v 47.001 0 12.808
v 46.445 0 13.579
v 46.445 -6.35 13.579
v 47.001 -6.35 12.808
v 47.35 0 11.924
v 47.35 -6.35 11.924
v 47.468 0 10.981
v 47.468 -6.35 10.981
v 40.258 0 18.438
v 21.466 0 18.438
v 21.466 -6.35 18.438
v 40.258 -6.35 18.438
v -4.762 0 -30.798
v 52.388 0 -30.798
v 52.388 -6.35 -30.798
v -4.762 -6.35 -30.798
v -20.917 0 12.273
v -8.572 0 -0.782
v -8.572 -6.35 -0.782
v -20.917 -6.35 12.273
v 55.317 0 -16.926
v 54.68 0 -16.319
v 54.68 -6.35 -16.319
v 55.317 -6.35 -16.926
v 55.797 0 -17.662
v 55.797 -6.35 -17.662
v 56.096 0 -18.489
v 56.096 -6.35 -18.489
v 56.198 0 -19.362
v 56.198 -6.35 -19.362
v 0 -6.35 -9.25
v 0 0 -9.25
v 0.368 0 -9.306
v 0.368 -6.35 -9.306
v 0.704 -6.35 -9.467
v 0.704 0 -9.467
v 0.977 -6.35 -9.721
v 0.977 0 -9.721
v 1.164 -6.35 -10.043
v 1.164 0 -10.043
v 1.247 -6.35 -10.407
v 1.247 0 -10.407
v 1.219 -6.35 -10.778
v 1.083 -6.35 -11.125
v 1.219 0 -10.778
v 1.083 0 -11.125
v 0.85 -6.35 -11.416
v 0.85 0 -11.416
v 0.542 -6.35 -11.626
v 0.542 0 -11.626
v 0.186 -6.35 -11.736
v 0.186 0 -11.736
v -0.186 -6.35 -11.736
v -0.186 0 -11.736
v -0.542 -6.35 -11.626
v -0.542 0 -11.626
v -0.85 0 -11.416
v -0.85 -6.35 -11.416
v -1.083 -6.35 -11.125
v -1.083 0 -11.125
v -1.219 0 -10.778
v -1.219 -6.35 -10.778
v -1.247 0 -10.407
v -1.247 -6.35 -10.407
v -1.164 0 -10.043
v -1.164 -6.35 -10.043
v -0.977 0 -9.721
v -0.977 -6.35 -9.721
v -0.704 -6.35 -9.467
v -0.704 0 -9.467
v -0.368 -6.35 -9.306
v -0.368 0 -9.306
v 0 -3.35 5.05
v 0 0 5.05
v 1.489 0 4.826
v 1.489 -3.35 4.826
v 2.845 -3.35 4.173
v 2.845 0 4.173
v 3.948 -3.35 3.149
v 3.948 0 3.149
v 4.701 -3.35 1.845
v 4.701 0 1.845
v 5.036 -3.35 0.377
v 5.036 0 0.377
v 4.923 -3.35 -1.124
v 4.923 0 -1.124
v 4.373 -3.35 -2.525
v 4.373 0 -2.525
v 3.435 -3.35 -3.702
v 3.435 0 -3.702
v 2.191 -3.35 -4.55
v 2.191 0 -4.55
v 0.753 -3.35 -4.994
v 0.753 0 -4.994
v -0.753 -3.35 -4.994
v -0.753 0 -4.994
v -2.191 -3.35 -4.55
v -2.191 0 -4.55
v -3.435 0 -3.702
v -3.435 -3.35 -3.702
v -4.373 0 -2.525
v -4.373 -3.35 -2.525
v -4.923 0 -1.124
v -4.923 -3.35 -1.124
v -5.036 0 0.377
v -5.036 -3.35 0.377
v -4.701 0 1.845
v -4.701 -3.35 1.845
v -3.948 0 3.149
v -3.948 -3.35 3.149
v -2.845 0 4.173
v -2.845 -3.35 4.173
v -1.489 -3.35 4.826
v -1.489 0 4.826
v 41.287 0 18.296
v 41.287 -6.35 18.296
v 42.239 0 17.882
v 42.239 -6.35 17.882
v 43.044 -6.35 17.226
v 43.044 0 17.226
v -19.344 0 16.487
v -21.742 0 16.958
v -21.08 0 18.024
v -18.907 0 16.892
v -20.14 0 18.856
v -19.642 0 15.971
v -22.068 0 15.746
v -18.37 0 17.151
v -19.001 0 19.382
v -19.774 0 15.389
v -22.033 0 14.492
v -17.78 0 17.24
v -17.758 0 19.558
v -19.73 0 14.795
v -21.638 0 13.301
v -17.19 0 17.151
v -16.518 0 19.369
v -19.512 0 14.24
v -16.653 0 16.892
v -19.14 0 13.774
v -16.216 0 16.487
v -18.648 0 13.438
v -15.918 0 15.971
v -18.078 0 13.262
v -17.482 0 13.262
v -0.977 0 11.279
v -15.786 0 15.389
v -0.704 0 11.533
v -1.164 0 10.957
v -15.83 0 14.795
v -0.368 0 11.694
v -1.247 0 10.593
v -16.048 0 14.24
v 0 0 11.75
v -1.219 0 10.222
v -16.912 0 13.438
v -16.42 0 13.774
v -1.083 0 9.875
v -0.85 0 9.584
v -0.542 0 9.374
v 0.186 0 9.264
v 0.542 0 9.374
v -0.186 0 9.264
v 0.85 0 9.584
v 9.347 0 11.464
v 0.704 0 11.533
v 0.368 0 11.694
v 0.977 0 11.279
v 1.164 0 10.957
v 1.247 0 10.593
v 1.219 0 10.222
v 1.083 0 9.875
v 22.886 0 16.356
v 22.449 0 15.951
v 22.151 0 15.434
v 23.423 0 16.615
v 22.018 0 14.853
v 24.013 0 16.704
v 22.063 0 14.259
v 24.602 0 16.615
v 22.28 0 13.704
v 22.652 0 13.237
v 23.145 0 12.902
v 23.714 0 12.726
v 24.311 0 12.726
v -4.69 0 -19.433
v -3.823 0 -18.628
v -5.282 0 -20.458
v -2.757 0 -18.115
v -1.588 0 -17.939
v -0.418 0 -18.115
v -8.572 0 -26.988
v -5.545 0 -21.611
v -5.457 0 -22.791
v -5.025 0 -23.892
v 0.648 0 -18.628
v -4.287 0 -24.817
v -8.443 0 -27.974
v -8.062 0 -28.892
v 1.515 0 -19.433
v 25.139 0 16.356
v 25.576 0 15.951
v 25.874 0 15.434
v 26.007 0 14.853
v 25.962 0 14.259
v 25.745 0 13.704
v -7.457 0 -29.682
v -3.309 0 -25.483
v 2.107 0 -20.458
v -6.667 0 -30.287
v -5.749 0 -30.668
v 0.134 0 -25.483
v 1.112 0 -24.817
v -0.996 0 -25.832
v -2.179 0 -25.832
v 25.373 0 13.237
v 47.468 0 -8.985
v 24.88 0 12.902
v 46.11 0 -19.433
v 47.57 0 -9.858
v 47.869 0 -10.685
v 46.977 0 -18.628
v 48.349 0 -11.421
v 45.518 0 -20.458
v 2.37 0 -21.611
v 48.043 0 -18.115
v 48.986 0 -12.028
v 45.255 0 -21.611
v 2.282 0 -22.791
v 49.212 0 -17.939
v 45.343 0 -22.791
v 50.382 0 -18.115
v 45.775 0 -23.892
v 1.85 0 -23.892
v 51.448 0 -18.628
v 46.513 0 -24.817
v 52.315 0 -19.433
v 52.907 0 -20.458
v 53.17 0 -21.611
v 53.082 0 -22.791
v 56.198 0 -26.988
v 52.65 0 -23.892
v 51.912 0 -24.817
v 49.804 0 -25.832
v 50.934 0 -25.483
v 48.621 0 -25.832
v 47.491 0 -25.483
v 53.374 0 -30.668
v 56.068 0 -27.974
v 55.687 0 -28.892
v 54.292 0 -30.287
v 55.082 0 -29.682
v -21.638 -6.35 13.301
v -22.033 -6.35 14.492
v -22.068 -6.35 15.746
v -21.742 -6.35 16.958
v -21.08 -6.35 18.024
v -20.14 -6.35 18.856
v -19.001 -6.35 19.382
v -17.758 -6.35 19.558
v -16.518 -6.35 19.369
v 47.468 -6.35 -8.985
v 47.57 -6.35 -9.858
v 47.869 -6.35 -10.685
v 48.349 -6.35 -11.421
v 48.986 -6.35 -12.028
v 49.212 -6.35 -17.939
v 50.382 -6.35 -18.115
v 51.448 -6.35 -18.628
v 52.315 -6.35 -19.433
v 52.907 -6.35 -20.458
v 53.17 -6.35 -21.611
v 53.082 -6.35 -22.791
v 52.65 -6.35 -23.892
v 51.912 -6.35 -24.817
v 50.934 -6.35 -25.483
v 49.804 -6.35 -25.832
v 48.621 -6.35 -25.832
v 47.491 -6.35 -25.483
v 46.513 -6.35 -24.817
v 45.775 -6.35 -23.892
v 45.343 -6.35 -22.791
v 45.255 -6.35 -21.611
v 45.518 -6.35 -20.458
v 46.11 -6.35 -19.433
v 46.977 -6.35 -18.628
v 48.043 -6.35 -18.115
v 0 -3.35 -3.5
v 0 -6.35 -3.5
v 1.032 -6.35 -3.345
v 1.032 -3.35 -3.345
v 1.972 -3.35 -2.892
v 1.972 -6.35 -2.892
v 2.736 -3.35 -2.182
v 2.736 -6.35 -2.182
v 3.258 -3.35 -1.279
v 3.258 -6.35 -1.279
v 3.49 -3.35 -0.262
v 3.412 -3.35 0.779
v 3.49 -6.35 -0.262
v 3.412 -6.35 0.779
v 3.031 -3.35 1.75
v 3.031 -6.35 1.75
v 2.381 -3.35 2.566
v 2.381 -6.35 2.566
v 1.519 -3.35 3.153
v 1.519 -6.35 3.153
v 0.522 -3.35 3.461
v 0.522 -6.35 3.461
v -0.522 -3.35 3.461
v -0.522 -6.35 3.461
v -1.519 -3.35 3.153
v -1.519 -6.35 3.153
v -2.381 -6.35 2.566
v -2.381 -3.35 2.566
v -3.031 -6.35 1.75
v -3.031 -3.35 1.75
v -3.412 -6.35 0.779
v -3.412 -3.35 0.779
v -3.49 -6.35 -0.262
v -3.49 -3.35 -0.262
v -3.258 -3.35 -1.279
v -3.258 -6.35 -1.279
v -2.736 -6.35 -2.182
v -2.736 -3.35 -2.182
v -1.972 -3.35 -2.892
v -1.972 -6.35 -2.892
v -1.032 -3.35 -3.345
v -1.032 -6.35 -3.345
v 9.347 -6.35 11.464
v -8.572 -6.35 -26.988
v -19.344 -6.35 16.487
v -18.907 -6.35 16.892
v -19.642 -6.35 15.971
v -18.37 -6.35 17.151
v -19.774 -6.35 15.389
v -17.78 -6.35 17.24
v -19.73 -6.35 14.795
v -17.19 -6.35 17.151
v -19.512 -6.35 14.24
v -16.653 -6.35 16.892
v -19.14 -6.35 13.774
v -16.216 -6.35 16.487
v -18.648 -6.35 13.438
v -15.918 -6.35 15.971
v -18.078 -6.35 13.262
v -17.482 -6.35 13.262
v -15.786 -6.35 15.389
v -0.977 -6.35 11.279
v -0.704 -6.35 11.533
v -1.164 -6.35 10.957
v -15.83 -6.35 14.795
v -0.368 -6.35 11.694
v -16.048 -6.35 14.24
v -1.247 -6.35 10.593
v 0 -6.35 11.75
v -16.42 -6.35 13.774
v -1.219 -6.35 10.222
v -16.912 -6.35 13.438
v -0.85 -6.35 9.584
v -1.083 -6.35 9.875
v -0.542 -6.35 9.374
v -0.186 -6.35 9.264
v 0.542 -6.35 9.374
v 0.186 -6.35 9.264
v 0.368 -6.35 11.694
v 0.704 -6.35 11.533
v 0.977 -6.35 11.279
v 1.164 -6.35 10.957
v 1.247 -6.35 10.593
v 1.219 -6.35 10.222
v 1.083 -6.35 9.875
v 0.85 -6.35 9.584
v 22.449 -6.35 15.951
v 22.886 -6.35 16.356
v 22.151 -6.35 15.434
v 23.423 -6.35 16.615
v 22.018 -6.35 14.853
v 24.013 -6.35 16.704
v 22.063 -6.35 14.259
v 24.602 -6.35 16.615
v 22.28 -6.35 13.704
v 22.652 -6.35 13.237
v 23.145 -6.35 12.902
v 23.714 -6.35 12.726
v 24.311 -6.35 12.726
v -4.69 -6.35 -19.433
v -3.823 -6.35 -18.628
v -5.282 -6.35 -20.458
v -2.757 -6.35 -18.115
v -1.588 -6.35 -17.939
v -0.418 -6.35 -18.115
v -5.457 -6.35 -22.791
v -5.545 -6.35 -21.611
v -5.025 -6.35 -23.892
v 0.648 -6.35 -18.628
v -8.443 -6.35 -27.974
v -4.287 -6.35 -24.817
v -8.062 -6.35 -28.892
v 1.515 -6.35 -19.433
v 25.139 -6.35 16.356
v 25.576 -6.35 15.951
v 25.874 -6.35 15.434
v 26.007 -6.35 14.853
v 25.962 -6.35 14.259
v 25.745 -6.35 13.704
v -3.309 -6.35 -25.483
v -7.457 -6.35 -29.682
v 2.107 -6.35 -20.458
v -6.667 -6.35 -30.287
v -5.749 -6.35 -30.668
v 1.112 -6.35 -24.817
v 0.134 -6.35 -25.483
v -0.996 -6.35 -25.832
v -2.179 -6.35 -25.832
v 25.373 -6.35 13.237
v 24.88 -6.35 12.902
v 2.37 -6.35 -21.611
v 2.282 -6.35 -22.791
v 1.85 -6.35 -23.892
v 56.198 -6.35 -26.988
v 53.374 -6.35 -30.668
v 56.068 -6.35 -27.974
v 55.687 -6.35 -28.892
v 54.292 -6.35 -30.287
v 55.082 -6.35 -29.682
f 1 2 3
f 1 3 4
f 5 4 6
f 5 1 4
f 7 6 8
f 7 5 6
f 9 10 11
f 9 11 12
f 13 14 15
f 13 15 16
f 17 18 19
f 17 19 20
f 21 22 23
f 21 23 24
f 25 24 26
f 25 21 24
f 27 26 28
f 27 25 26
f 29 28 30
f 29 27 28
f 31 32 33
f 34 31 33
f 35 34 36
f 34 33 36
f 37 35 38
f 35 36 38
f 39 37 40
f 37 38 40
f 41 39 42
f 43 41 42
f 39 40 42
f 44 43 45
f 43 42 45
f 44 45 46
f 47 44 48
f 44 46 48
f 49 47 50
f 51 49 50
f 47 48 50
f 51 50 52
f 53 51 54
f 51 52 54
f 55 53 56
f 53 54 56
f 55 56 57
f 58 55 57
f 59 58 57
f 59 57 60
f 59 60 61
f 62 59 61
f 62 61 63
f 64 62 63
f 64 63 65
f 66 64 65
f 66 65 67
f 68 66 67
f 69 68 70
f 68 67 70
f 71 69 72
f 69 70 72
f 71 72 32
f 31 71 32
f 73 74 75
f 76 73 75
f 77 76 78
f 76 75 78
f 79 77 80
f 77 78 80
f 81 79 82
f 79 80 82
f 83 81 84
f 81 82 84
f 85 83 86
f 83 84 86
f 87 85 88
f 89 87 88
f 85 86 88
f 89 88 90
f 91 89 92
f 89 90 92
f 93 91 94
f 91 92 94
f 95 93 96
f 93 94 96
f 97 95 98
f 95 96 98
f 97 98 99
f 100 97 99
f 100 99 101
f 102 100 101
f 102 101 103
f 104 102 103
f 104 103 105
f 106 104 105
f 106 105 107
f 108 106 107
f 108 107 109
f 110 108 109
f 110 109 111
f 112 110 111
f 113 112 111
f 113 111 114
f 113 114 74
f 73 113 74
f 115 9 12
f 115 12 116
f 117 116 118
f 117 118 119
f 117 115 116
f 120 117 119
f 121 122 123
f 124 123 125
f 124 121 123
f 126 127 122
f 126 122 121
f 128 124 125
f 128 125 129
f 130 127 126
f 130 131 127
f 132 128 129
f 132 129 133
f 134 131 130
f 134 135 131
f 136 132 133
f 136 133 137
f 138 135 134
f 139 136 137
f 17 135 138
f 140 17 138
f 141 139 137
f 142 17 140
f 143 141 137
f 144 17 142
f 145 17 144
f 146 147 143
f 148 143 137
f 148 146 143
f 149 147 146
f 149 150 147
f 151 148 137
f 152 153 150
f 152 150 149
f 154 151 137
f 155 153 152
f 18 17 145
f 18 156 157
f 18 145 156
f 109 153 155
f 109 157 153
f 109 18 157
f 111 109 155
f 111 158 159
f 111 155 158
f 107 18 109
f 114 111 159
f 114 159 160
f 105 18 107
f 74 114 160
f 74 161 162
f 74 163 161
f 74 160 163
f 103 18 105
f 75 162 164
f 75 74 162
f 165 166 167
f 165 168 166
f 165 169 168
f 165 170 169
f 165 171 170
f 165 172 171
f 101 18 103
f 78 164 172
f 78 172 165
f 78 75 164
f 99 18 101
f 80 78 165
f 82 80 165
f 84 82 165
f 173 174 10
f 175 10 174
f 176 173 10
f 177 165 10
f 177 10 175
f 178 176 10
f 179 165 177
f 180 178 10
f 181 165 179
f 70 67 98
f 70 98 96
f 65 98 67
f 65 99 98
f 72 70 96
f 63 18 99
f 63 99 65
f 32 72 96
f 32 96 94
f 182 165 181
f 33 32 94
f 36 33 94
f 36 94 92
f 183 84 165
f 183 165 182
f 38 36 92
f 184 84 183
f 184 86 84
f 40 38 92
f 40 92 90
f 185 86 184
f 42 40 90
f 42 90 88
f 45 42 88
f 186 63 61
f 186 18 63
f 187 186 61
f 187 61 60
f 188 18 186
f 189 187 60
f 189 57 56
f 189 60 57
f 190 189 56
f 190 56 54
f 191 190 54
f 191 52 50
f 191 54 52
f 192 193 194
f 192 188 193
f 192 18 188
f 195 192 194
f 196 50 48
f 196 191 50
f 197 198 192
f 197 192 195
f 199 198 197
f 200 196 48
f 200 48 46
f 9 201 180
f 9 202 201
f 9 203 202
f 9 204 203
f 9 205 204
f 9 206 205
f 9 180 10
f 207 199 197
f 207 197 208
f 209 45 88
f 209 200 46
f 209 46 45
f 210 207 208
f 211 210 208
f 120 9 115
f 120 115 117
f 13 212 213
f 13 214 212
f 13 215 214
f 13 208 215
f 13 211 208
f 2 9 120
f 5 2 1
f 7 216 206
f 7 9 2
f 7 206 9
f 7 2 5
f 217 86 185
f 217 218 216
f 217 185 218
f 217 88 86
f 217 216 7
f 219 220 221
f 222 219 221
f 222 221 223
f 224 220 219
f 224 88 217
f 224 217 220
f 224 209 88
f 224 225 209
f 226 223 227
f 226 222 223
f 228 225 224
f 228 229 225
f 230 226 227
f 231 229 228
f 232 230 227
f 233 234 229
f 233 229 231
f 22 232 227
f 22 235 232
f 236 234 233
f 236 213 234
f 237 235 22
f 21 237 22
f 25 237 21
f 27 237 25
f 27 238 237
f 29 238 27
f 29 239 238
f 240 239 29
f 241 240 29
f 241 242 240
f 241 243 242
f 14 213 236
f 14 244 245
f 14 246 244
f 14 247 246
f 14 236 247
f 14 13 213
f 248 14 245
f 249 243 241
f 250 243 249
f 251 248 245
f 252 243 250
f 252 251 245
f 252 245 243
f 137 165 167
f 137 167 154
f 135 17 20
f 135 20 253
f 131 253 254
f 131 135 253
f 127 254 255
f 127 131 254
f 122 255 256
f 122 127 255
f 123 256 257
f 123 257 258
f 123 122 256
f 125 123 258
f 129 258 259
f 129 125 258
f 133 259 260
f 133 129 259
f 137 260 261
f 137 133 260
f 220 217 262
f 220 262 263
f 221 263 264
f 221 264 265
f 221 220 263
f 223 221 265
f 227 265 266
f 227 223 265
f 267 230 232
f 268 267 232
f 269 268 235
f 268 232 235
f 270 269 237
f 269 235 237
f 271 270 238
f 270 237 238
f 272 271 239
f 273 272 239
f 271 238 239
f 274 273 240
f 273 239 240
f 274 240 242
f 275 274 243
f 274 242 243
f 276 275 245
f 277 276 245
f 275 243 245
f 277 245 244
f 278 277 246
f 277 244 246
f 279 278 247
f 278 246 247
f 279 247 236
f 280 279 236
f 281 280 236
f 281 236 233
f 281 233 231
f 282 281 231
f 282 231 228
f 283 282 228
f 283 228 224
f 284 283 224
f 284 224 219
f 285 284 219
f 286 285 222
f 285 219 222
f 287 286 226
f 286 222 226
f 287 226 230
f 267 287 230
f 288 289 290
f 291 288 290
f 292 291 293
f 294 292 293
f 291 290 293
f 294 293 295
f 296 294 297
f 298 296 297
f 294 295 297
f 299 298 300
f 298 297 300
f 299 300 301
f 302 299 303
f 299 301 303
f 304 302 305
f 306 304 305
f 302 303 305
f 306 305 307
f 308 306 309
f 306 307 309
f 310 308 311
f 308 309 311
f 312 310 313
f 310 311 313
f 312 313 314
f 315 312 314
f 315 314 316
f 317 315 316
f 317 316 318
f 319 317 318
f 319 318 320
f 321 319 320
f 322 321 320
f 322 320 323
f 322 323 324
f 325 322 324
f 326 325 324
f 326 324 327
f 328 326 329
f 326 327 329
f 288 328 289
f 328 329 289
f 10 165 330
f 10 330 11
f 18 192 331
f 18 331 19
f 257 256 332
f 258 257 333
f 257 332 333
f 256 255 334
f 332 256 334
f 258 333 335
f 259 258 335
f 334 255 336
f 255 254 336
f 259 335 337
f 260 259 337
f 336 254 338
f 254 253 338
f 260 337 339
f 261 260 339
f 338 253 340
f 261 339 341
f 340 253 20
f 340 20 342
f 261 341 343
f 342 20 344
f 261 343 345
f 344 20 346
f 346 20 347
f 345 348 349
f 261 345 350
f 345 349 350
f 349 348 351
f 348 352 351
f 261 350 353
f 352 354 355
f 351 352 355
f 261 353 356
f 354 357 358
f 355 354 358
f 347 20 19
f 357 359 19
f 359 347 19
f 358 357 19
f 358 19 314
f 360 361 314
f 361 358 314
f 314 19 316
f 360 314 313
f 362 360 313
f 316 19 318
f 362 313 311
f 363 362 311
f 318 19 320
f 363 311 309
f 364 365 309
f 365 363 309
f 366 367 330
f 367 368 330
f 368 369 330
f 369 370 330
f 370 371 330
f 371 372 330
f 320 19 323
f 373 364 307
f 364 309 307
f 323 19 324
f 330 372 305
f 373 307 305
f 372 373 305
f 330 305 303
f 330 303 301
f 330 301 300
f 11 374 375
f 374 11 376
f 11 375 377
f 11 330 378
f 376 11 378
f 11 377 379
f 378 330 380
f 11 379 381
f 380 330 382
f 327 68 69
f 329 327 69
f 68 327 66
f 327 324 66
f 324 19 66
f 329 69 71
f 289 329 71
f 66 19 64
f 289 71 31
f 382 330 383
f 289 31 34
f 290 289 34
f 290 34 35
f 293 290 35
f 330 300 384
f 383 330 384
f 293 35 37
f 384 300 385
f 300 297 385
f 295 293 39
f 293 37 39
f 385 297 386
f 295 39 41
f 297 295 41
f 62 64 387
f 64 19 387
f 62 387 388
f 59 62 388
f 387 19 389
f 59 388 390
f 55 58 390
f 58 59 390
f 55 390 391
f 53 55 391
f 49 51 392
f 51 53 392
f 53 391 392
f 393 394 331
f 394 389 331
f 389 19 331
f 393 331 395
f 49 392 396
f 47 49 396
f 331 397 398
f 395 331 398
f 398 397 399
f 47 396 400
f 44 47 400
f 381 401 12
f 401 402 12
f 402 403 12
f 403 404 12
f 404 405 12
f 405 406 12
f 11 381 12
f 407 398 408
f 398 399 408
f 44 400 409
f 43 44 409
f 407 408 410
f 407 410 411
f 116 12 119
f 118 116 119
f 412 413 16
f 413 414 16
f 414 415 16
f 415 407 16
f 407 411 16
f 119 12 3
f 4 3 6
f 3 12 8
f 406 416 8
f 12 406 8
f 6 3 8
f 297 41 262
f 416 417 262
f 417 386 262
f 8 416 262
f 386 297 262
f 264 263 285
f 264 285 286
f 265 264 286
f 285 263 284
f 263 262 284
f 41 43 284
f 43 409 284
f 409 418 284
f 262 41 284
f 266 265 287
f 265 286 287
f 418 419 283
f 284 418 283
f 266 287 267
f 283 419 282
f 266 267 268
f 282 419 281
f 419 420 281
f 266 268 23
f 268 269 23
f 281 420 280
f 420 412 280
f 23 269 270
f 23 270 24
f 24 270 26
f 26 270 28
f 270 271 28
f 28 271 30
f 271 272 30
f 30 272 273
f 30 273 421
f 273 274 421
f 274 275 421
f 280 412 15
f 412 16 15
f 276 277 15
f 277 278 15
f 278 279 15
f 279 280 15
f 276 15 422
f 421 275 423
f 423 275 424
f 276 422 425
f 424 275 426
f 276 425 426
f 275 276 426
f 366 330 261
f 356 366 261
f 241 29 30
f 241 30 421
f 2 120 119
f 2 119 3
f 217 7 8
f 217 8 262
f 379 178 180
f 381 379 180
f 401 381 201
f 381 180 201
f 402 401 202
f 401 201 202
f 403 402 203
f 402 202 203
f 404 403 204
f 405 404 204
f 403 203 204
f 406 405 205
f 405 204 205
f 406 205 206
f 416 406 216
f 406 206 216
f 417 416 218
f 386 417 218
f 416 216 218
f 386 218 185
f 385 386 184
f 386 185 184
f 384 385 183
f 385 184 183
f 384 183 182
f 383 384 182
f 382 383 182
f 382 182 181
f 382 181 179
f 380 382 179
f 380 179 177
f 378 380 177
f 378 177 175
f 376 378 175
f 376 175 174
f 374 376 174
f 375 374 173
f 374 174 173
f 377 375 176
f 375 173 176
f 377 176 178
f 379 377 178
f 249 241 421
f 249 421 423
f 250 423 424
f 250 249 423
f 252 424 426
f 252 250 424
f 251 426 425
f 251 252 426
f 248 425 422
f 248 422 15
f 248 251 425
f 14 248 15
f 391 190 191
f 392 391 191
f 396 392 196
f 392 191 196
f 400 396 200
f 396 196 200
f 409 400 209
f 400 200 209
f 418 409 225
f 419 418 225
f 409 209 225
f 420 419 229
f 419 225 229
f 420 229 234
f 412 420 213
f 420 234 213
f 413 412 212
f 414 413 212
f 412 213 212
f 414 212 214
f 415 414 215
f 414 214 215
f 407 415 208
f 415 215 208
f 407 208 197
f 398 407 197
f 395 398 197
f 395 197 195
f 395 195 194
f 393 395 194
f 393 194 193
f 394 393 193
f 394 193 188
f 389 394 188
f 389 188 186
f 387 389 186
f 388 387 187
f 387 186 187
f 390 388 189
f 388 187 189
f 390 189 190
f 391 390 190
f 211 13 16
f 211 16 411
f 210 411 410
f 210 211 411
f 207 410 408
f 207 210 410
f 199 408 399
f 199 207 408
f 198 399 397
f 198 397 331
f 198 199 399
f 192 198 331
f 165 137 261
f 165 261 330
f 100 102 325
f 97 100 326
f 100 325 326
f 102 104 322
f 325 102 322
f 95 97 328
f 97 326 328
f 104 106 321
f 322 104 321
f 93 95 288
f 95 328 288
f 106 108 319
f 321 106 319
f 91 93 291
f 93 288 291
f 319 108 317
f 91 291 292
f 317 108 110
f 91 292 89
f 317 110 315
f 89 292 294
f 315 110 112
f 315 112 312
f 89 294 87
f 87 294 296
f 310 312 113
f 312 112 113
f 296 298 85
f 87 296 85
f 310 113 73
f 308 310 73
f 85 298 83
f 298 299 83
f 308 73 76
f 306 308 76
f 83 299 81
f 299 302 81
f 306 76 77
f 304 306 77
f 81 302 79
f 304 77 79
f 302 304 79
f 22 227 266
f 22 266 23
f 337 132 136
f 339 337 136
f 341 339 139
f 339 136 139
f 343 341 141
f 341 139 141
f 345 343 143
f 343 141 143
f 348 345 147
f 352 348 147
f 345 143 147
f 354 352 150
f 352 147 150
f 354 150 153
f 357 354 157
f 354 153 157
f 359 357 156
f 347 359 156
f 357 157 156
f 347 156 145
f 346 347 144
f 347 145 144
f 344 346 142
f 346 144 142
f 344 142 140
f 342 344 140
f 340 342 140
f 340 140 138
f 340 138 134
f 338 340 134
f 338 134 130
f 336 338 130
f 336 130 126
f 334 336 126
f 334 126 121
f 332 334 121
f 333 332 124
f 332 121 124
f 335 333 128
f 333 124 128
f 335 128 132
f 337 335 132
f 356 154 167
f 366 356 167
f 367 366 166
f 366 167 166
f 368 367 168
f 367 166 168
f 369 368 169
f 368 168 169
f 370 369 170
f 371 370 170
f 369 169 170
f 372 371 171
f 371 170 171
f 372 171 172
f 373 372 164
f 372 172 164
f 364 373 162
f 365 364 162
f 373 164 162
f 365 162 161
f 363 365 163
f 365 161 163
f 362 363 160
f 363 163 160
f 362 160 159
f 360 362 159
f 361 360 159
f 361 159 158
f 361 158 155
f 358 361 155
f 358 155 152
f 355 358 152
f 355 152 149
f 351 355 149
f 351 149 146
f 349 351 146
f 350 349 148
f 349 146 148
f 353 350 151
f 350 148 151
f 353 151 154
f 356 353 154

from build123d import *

# Parameters (mm, degrees)
SKETCH4_R           = 2
SKETCH4_R_2         = 1.25
SKETCH4_R_3         = 5.05
SKETCH4_R_4         = 3.96875
BOSS_EXTRUDE2_DEPTH = 6.35
SKETCH31_R          = 6.35
SKETCH31_R_2        = 3.499999985
BOSS_EXTRUDE5_DEPTH = 3


with BuildPart() as part:
    # Sketch4 → Boss-Extrude2 (new body)
    # profile 1 of 2: a face of its own
    with BuildSketch(Plane(origin=(0, 0, 0), x_dir=(1, 0, 0), z_dir=(0, 1, 0))):
        with BuildLine():
            Line((21.46596982, -18.4375), (40.257702493, -18.4375))
            ThreePointArc((40.257702493, -18.4375), (41.776936446, -18.121498883), (43.044160097, -17.225913752))
            Line((43.044160097, -17.225913752), (46.444939319, -13.579024524))
            ThreePointArc((46.444939319, -13.579024524), (47.203372649, -12.376980446), (47.468481715, -10.980610773))
            Line((47.468481715, -10.980610773), (47.468481715, 8.985116992))
            ThreePointArc((47.468481715, 8.985116992), (47.868781798, 10.685130659), (48.985566477, 12.027918285))
            Line((48.985566477, 12.027918285), (54.680415238, 16.319294633))
            ThreePointArc((54.680415238, 16.319294633), (55.797199918, 17.662082259), (56.1975, 19.362095927))
            Line((56.1975, 19.362095927), (56.1975, 26.9875))
            ThreePointArc((56.1975, 26.9875), (55.081576836, 29.681576836), (52.3875, 30.7975))
            Line((52.3875, 30.7975), (-4.7625, 30.7975))
            ThreePointArc((-4.7625, 30.7975), (-7.456576836, 29.681576836), (-8.5725, 26.9875))
            Line((-8.5725, 26.9875), (-8.5725, 0.781747009))
            Line((-8.5725, 0.781747009), (-20.917416467, -12.27322702))
            ThreePointArc((-20.917416467, -12.27322702), (-21.4498857, -17.515316011), (-16.517810325, -19.369406885))
            Line((-16.517810325, -19.369406885), (9.346561417, -11.463733294))
            Line((9.346561417, -11.463733294), (21.46596982, -18.4375))
        make_face()
        with Locations(Location((-17.78, -15.24, 0), (0, 0, 270))):
            Circle(SKETCH4_R, mode=Mode.SUBTRACT)
        with Locations(Location((0, -10.5, 0), (0, 0, 270))):
            Circle(SKETCH4_R_2, mode=Mode.SUBTRACT)
        with Locations(Location((0, 0, 0), (0, 0, 270))):
            Circle(SKETCH4_R_3, mode=Mode.SUBTRACT)
        with Locations(Location((24.012521227, -14.703599027, 0), (0, 0, 270))):
            Circle(SKETCH4_R, mode=Mode.SUBTRACT)
        with Locations(Location((0, 10.5, 0), (0, 0, 270))):
            Circle(SKETCH4_R_2, mode=Mode.SUBTRACT)
        with Locations(Location((-1.5875, 21.9075, 0), (0, 0, 270))):
            Circle(SKETCH4_R_4, mode=Mode.SUBTRACT)
        with Locations(Location((49.2125, 21.9075, 0), (0, 0, 270))):
            Circle(SKETCH4_R_4, mode=Mode.SUBTRACT)
    # profile 2 of 2: a face of its own
    with BuildSketch(Plane(origin=(0, 0, 0), x_dir=(1, 0, 0), z_dir=(0, 1, 0))):
        with BuildLine():
            Line((21.46596982, -18.4375), (40.257702493, -18.4375))
            ThreePointArc((40.257702493, -18.4375), (41.776936446, -18.121498883), (43.044160097, -17.225913752))
            Line((43.044160097, -17.225913752), (46.444939319, -13.579024524))
            ThreePointArc((46.444939319, -13.579024524), (47.203372649, -12.376980446), (47.468481715, -10.980610773))
            Line((47.468481715, -10.980610773), (47.468481715, 8.985116992))
            ThreePointArc((47.468481715, 8.985116992), (47.868781798, 10.685130659), (48.985566477, 12.027918285))
            Line((48.985566477, 12.027918285), (54.680415238, 16.319294633))
            ThreePointArc((54.680415238, 16.319294633), (55.797199918, 17.662082259), (56.1975, 19.362095927))
            Line((56.1975, 19.362095927), (56.1975, 26.9875))
            ThreePointArc((56.1975, 26.9875), (55.081576836, 29.681576836), (52.3875, 30.7975))
            Line((52.3875, 30.7975), (-4.7625, 30.7975))
            ThreePointArc((-4.7625, 30.7975), (-7.456576836, 29.681576836), (-8.5725, 26.9875))
            Line((-8.5725, 26.9875), (-8.5725, 0.781747009))
            Line((-8.5725, 0.781747009), (-20.917416467, -12.27322702))
            ThreePointArc((-20.917416467, -12.27322702), (-21.4498857, -17.515316011), (-16.517810325, -19.369406885))
            Line((-16.517810325, -19.369406885), (9.346561417, -11.463733294))
            Line((9.346561417, -11.463733294), (21.46596982, -18.4375))
        make_face()
        with Locations(Location((-17.78, -15.24, 0), (0, 0, 270))):
            Circle(SKETCH4_R, mode=Mode.SUBTRACT)
        with Locations(Location((0, -10.5, 0), (0, 0, 270))):
            Circle(SKETCH4_R_2, mode=Mode.SUBTRACT)
        with Locations(Location((0, 0, 0), (0, 0, 270))):
            Circle(SKETCH4_R_3, mode=Mode.SUBTRACT)
        with Locations(Location((24.012521227, -14.703599027, 0), (0, 0, 270))):
            Circle(SKETCH4_R, mode=Mode.SUBTRACT)
        with Locations(Location((0, 10.5, 0), (0, 0, 270))):
            Circle(SKETCH4_R_2, mode=Mode.SUBTRACT)
        with Locations(Location((-1.5875, 21.9075, 0), (0, 0, 270))):
            Circle(SKETCH4_R_4, mode=Mode.SUBTRACT)
        with Locations(Location((49.2125, 21.9075, 0), (0, 0, 270))):
            Circle(SKETCH4_R_4, mode=Mode.SUBTRACT)
    extrude(amount=-BOSS_EXTRUDE2_DEPTH)

    # Sketch31 → Boss-Extrude5 (add)
    with BuildSketch(Plane.XZ.offset(6.35)):
        Circle(SKETCH31_R)
        with Locations(Location((0, 0, 0), (0, 0, 270))):
            Circle(SKETCH31_R_2, mode=Mode.SUBTRACT)
    extrude(amount=-BOSS_EXTRUDE5_DEPTH)


solid = part.part
